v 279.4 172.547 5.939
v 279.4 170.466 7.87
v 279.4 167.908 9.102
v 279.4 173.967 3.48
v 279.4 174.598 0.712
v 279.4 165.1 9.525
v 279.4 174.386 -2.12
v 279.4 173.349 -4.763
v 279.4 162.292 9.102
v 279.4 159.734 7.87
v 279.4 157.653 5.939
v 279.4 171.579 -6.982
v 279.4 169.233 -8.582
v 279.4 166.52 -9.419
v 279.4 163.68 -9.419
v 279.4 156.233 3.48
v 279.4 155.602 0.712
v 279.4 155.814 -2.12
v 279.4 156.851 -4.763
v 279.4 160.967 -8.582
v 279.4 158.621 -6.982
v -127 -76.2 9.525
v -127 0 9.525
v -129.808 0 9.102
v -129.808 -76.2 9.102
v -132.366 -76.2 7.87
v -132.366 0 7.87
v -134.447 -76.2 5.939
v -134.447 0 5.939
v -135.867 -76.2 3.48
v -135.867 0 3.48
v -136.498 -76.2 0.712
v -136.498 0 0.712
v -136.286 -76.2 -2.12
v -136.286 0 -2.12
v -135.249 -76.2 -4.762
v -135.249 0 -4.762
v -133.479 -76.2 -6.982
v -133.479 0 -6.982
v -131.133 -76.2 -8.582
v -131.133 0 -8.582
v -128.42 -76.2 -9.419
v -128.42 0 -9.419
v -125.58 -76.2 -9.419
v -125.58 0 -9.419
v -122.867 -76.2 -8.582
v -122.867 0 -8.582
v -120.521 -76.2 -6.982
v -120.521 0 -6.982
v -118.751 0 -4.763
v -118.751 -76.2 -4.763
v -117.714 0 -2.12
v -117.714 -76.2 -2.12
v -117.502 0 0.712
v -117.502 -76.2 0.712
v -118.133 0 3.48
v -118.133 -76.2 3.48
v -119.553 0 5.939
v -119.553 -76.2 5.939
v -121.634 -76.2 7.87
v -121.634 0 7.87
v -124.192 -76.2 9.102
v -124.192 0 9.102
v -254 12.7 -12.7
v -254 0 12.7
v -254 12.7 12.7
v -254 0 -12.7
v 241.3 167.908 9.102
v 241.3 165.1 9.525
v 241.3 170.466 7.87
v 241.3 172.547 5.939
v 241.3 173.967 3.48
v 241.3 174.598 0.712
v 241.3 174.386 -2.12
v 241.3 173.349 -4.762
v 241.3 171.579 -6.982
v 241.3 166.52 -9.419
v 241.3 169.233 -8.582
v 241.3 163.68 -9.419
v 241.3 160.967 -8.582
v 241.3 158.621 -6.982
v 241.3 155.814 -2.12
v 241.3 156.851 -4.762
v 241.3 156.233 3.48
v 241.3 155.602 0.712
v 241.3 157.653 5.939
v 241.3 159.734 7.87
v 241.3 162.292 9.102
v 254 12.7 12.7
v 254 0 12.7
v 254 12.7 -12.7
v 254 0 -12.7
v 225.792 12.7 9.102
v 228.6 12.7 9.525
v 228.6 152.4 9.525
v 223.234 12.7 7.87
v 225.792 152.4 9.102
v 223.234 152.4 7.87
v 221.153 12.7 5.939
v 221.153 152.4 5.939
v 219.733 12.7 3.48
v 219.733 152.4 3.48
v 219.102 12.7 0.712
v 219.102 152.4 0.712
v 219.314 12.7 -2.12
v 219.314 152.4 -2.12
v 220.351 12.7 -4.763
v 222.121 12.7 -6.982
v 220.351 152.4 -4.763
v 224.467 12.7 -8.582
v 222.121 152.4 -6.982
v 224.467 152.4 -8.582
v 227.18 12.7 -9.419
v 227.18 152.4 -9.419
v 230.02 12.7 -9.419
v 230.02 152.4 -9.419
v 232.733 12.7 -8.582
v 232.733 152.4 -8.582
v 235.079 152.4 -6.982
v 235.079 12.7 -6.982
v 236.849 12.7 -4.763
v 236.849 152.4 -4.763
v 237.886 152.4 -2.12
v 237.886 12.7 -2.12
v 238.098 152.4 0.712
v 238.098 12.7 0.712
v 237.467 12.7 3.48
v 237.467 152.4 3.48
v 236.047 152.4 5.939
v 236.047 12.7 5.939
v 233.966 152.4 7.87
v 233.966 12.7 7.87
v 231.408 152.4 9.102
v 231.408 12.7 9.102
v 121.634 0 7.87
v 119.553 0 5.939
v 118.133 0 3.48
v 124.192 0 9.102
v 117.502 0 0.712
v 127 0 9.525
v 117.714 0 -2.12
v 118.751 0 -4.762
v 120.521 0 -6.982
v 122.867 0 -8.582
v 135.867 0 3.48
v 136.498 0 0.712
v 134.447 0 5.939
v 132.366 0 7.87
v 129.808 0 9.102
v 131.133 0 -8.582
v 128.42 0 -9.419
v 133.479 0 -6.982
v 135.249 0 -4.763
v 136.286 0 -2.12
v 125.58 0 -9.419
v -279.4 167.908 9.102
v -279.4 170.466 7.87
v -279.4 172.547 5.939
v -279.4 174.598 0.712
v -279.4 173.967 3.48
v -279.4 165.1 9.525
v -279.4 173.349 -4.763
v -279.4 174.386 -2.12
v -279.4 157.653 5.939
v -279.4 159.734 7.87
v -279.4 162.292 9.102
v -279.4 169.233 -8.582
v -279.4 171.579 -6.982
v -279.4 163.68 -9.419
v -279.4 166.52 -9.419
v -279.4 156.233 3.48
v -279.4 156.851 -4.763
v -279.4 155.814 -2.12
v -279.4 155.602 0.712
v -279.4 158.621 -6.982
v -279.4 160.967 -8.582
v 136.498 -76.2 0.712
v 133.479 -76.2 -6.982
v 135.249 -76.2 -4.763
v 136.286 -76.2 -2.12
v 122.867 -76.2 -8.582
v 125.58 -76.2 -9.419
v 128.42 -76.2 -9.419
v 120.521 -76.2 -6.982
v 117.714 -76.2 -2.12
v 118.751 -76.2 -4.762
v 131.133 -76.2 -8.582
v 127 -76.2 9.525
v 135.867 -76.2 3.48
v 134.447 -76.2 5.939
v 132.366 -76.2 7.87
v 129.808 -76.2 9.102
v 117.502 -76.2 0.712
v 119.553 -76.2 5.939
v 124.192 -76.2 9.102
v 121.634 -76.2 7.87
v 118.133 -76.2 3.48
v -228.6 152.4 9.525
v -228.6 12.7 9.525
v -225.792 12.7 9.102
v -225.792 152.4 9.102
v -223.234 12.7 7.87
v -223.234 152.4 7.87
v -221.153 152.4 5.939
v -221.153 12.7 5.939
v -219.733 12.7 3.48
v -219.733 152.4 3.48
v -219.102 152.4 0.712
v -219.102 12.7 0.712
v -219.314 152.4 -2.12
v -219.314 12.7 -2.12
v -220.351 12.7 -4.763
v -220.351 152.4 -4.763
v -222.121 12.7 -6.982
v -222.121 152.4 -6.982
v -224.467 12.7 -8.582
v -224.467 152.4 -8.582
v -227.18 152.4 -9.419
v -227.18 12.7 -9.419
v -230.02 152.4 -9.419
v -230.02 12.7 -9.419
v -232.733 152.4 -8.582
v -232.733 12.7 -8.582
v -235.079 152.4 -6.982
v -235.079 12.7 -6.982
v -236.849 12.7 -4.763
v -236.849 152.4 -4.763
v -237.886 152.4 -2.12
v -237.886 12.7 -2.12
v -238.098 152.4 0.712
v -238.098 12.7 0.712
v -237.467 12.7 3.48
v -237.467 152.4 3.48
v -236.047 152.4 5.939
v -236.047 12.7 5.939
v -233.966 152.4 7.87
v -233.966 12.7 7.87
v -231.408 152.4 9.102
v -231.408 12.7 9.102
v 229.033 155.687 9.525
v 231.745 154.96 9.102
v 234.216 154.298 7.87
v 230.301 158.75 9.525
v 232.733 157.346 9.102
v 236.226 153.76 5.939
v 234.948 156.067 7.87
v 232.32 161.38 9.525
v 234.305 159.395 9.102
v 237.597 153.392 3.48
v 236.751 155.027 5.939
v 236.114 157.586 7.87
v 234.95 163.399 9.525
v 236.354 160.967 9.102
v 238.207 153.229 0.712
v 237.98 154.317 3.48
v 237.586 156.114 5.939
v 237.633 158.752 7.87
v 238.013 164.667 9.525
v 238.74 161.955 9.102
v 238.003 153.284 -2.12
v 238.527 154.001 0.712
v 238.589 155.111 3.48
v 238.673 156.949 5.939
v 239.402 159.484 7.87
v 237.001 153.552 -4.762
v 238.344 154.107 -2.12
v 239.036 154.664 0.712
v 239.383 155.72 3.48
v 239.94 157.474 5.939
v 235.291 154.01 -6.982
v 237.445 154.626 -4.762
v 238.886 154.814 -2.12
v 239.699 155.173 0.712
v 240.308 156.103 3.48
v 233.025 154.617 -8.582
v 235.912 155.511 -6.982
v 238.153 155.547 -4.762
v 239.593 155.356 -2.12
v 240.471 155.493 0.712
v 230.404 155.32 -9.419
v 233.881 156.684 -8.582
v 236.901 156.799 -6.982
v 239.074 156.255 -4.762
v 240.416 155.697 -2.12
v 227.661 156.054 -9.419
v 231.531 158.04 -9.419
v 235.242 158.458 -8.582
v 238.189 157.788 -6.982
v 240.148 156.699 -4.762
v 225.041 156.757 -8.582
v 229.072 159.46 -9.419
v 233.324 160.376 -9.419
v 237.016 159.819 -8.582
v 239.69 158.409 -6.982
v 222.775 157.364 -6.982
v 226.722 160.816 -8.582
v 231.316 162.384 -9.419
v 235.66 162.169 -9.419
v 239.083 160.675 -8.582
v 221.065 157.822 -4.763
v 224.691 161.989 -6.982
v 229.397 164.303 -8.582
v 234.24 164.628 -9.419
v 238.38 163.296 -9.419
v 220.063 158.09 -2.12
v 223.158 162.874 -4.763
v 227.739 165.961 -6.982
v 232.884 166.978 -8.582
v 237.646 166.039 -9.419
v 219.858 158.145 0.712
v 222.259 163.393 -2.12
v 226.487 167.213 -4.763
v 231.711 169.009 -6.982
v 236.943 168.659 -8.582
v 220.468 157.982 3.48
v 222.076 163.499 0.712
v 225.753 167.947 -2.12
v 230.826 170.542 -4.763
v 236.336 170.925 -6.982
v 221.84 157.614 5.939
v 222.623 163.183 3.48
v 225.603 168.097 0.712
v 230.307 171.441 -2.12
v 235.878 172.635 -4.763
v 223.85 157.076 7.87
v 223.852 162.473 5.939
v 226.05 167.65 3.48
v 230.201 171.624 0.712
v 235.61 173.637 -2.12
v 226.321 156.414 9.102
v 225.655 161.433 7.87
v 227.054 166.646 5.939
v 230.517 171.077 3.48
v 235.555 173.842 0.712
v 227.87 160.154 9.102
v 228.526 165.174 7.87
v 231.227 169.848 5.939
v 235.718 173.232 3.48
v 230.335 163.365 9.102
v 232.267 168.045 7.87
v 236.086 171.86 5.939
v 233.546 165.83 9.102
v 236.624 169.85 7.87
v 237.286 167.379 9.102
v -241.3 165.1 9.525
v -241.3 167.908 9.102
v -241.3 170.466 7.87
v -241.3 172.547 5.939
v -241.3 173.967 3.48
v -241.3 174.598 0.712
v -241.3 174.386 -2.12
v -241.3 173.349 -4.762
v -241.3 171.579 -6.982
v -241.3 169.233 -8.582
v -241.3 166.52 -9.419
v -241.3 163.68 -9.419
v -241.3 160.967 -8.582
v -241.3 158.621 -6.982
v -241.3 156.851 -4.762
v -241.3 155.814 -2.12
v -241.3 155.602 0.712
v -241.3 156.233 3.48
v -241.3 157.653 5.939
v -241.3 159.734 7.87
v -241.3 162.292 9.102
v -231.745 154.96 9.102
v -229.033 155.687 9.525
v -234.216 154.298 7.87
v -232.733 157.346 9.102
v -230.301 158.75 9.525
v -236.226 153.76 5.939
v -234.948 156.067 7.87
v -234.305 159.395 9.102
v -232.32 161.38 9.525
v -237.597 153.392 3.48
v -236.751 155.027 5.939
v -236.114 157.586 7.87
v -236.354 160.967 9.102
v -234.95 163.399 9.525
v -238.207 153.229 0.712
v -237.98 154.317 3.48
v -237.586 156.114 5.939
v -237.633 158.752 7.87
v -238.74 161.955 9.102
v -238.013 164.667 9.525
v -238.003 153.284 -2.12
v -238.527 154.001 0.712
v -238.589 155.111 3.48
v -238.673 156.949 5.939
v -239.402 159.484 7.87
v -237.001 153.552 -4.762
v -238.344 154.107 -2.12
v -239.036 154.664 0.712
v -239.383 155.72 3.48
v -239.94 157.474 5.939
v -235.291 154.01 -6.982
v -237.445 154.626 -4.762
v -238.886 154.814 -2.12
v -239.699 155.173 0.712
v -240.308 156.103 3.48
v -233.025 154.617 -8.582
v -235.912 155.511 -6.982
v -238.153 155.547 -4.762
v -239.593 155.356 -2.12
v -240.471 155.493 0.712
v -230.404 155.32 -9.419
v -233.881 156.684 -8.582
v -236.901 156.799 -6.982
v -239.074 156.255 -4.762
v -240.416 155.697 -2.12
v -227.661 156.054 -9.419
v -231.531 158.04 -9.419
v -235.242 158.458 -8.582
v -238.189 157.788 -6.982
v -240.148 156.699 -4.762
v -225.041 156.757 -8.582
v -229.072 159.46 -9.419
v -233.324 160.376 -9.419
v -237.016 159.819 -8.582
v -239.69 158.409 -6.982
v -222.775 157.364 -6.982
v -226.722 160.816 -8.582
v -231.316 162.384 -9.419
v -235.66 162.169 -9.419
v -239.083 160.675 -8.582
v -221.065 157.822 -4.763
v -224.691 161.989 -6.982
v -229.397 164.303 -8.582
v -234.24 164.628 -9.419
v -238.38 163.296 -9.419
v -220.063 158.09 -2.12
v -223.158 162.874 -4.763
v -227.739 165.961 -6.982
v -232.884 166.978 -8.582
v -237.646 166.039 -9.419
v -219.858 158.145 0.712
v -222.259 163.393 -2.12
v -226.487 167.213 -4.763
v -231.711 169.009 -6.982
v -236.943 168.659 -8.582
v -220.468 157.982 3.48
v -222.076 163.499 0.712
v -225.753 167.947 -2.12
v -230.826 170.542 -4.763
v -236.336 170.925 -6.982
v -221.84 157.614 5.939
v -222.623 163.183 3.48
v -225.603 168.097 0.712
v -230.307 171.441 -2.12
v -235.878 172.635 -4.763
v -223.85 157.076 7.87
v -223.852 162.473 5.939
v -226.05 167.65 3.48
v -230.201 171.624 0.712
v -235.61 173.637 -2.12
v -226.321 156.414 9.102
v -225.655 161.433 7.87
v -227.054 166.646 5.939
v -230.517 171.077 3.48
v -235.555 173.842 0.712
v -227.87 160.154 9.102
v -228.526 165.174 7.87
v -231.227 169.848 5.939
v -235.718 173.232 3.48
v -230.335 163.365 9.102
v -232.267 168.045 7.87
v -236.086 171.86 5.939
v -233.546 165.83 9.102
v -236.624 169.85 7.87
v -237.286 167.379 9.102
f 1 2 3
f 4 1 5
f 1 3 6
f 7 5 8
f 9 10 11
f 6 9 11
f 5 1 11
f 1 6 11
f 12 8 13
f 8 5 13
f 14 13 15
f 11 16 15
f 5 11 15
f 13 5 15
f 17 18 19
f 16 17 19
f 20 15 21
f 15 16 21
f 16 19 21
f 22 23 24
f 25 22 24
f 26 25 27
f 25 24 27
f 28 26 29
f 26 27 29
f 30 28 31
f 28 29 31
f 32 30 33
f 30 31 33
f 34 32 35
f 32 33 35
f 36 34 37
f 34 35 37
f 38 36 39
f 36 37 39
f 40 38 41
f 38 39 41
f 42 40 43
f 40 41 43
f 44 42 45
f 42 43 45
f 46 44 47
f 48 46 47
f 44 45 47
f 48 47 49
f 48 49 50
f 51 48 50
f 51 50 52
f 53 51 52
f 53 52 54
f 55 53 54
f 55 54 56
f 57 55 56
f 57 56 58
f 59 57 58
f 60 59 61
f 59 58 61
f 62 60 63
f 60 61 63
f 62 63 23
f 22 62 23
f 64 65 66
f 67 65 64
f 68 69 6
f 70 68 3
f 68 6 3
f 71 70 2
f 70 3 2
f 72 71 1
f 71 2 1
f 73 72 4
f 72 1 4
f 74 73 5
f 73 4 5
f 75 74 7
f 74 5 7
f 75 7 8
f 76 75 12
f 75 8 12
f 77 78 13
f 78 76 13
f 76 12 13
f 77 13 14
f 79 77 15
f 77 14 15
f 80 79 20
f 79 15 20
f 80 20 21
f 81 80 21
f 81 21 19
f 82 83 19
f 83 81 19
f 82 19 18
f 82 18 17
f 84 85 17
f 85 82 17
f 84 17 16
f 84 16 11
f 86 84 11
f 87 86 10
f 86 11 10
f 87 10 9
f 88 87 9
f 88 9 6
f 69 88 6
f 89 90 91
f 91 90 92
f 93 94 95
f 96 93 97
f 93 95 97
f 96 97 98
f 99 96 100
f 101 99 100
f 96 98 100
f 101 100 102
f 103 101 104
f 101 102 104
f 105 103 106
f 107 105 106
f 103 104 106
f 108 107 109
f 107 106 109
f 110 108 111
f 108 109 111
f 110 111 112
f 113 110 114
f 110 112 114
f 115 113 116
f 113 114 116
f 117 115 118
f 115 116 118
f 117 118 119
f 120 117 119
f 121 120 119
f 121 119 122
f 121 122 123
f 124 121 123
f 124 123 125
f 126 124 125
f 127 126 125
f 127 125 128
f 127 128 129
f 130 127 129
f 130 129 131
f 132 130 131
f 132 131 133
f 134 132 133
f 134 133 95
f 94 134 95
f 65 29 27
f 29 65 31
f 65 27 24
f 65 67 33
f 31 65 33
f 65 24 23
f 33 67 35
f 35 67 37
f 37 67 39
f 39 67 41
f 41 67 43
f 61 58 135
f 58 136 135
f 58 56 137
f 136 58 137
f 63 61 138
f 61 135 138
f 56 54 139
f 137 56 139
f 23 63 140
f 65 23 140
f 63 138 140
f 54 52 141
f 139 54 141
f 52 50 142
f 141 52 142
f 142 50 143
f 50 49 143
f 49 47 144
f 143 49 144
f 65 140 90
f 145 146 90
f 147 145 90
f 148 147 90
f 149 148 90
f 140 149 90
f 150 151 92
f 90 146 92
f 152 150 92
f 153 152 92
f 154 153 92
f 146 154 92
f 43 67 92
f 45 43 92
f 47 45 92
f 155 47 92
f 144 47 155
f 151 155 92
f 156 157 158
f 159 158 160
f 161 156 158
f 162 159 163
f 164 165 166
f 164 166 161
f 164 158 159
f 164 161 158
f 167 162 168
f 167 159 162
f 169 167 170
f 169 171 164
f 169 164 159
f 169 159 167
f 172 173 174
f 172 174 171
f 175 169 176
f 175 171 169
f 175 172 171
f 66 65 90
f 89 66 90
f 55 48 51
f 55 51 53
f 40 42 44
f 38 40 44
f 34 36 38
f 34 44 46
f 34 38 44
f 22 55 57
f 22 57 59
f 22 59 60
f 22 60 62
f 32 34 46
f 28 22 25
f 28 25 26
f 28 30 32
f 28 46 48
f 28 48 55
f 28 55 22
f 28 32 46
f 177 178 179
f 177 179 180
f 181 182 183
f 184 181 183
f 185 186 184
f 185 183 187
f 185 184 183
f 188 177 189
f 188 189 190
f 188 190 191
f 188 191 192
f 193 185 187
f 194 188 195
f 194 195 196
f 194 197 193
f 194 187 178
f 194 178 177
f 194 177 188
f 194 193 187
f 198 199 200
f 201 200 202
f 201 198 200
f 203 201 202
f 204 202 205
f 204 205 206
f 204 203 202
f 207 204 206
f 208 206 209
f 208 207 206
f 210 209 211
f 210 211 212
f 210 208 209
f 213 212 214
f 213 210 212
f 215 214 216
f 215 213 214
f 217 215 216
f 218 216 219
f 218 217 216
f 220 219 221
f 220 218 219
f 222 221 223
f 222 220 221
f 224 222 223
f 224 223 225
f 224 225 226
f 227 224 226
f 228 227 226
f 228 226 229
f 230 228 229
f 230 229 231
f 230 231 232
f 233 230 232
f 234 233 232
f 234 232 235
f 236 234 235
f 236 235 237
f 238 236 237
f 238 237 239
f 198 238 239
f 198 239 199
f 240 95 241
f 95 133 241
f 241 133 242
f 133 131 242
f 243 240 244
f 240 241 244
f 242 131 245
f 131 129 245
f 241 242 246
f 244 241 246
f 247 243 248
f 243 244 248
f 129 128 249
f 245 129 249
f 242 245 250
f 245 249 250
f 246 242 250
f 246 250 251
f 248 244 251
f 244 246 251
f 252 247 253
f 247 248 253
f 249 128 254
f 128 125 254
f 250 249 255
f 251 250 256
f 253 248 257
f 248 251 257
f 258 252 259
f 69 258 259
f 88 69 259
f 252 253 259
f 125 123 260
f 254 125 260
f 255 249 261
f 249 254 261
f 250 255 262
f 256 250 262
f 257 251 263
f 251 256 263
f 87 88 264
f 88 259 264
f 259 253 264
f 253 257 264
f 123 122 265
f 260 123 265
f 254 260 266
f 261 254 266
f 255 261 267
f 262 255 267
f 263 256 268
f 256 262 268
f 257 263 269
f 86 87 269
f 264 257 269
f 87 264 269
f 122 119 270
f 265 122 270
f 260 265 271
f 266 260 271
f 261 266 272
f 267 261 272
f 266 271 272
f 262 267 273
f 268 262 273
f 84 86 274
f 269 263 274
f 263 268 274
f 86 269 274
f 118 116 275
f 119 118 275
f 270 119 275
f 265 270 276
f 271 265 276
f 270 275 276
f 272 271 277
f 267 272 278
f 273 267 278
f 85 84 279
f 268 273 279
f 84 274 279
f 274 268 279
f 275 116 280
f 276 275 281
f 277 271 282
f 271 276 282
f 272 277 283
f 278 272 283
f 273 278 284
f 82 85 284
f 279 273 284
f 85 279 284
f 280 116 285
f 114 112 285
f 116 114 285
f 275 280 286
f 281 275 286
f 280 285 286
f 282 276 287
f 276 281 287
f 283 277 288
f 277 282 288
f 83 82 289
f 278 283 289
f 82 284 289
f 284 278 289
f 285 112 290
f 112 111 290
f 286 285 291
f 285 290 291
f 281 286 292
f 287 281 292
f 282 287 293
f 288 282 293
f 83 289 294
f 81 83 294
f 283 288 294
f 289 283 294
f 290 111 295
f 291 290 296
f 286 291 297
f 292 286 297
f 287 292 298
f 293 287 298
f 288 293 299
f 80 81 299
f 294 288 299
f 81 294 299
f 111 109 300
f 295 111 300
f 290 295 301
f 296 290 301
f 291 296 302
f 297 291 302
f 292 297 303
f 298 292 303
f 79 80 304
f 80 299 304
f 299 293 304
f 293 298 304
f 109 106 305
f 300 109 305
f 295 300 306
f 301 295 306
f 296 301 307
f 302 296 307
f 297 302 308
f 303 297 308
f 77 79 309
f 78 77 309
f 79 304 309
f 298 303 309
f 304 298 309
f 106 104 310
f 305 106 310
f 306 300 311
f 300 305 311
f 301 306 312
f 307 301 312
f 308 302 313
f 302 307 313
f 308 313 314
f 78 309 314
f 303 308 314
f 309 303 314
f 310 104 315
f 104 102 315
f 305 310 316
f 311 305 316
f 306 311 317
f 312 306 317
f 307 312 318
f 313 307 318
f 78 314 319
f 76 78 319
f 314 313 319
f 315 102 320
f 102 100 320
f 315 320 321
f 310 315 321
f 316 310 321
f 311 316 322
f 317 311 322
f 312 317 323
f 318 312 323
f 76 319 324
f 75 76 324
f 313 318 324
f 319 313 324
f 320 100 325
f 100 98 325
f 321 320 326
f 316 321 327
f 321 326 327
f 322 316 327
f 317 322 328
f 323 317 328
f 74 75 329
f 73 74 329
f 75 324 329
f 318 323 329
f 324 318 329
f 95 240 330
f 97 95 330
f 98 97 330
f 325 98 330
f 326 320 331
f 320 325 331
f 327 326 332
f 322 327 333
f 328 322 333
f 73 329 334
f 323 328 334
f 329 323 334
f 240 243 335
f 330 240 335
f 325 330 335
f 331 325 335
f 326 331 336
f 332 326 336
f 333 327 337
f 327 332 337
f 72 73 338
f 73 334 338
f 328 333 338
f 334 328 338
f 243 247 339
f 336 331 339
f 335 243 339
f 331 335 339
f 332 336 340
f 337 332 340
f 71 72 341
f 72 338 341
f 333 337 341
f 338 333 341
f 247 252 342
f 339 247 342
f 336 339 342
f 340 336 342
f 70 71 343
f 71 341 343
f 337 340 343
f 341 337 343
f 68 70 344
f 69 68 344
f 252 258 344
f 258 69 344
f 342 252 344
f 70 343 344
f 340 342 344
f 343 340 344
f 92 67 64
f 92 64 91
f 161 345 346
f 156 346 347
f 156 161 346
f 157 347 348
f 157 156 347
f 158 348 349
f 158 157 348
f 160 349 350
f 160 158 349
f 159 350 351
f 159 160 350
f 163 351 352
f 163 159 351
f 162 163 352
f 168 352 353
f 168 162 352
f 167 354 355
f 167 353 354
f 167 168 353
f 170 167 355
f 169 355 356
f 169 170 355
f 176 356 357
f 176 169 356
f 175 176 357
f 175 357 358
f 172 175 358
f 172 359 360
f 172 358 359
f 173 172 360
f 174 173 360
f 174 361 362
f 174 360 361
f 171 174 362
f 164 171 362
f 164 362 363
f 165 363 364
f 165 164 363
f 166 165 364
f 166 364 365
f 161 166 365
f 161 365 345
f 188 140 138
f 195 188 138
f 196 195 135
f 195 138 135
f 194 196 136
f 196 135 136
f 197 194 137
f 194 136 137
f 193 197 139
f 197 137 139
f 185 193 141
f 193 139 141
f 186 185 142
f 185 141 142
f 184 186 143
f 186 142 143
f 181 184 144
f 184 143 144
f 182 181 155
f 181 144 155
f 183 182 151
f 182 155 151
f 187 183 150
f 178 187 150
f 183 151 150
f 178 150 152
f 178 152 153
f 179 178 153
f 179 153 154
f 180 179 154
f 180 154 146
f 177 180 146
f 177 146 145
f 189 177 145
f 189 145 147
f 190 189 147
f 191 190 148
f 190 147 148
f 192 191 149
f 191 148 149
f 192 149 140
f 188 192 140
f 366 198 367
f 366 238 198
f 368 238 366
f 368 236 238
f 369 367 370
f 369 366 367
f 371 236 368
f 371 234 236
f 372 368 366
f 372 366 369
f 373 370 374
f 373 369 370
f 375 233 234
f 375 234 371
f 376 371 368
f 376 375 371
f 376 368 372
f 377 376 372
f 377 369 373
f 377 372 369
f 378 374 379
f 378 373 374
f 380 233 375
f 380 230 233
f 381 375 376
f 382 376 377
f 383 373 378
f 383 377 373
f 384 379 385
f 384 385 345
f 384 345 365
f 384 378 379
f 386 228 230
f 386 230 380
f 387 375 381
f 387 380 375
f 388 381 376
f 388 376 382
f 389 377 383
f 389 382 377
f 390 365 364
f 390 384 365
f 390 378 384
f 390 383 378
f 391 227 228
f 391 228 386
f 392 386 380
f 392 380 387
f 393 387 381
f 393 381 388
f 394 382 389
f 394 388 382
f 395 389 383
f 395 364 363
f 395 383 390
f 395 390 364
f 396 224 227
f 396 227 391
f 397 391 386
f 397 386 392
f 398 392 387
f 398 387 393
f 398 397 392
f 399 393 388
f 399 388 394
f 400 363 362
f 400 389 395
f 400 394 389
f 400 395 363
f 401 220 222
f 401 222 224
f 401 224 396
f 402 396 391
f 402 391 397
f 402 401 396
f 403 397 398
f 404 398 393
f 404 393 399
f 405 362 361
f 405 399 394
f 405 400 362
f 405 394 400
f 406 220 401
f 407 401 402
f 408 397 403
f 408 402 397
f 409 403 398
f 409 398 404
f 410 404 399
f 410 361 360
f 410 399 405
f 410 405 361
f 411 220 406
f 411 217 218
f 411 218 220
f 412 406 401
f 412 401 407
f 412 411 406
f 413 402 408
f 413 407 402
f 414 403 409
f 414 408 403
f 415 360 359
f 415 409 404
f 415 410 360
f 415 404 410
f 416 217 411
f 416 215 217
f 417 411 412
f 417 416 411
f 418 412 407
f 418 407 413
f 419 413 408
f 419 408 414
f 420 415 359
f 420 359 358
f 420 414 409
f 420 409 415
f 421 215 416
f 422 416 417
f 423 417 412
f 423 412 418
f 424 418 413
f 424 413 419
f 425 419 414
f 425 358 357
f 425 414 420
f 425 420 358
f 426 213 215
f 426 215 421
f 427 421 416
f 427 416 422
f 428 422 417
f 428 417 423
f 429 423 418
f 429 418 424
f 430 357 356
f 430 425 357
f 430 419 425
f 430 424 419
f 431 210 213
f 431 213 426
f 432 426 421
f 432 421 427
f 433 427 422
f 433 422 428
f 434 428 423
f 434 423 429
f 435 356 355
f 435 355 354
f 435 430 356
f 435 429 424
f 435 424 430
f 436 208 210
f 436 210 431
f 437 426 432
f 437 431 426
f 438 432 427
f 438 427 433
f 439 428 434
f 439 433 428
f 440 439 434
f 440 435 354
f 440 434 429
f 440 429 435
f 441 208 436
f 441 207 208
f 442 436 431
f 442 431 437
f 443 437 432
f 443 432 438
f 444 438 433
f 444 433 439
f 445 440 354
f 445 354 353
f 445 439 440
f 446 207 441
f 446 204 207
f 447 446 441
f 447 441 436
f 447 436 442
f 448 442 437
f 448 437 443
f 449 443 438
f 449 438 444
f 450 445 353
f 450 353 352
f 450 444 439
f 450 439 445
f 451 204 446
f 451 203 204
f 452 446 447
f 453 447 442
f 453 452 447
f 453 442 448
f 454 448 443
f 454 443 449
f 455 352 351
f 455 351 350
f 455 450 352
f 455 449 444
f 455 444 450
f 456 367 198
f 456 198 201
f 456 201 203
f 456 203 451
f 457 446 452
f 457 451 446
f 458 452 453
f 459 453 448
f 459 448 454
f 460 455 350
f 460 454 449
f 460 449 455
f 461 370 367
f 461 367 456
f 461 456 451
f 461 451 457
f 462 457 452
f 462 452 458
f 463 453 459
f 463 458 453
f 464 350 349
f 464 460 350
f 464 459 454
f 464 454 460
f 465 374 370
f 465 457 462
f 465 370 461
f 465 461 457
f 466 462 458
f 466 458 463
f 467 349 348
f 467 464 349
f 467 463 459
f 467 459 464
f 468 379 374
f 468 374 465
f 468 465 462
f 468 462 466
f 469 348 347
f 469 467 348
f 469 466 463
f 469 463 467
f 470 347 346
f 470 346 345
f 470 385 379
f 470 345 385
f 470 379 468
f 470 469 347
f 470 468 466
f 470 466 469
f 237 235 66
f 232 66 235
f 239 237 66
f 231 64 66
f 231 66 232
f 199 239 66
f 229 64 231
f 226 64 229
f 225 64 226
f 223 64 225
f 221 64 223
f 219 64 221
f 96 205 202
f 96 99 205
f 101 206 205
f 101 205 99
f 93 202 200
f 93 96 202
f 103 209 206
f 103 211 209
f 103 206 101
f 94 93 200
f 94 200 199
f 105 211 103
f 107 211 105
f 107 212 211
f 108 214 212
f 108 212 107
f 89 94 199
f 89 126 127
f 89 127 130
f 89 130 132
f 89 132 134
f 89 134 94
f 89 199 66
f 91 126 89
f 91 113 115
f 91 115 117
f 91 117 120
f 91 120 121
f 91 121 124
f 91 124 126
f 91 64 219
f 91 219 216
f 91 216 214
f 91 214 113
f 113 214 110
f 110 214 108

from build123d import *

# Parameters (mm, degrees)
SKETCH1_W           = 508
SKETCH1_H           = 25.4
BOSS_EXTRUDE1_DEPTH = 12.7
SKETCH3_R           = 9.525
BOSS_EXTRUDE2_DEPTH = 76.2
SWEEP1_PROFILE_R    = 9.525


with BuildPart() as part:
    # Sketch1 → Boss-Extrude1 (new body)
    with BuildSketch(Plane(origin=(0, 0, 0), x_dir=(1, 0, 0), z_dir=(0, 1, 0))):
        Rectangle(SKETCH1_W, SKETCH1_H)
    extrude(amount=BOSS_EXTRUDE1_DEPTH)

    # Sketch3 → Boss-Extrude2 (add)
    with BuildSketch(Plane.XZ):
        with Locations(Location((-127, 0, 0), (0, 0, 90))):
            Circle(SKETCH3_R)
        with Locations(Location((127, 0, 0), (0, 0, 90))):
            Circle(SKETCH3_R)
    extrude(amount=BOSS_EXTRUDE2_DEPTH)

    # Sweep1: sweep along a path in Sketch4
    with BuildLine(Plane.XY) as sweep1_path:
        Line((-228.6, 12.7), (-228.6, 152.4))
        ThreePointArc((-228.6, 152.4), (-232.319743879, 161.380256121), (-241.3, 165.1))
        Line((-241.3, 165.1), (-279.4, 165.1))
    # Sweep1 profile (on start of the path) → Sweep1 (sweep)
    with BuildSketch(Plane(origin=(-228.6, 12.7, 0), x_dir=(0, 0, 1), z_dir=(0, 1, 0))):
        Circle(SWEEP1_PROFILE_R)
    sweep1 = sweep(path=sweep1_path.line)

    # Mirror1: Sweep1 across plane
    add(sweep1.mirror(Plane(origin=(0, 0, 0), x_dir=(0, 0, 1), z_dir=(1, 0, 0))))


solid = part.part
